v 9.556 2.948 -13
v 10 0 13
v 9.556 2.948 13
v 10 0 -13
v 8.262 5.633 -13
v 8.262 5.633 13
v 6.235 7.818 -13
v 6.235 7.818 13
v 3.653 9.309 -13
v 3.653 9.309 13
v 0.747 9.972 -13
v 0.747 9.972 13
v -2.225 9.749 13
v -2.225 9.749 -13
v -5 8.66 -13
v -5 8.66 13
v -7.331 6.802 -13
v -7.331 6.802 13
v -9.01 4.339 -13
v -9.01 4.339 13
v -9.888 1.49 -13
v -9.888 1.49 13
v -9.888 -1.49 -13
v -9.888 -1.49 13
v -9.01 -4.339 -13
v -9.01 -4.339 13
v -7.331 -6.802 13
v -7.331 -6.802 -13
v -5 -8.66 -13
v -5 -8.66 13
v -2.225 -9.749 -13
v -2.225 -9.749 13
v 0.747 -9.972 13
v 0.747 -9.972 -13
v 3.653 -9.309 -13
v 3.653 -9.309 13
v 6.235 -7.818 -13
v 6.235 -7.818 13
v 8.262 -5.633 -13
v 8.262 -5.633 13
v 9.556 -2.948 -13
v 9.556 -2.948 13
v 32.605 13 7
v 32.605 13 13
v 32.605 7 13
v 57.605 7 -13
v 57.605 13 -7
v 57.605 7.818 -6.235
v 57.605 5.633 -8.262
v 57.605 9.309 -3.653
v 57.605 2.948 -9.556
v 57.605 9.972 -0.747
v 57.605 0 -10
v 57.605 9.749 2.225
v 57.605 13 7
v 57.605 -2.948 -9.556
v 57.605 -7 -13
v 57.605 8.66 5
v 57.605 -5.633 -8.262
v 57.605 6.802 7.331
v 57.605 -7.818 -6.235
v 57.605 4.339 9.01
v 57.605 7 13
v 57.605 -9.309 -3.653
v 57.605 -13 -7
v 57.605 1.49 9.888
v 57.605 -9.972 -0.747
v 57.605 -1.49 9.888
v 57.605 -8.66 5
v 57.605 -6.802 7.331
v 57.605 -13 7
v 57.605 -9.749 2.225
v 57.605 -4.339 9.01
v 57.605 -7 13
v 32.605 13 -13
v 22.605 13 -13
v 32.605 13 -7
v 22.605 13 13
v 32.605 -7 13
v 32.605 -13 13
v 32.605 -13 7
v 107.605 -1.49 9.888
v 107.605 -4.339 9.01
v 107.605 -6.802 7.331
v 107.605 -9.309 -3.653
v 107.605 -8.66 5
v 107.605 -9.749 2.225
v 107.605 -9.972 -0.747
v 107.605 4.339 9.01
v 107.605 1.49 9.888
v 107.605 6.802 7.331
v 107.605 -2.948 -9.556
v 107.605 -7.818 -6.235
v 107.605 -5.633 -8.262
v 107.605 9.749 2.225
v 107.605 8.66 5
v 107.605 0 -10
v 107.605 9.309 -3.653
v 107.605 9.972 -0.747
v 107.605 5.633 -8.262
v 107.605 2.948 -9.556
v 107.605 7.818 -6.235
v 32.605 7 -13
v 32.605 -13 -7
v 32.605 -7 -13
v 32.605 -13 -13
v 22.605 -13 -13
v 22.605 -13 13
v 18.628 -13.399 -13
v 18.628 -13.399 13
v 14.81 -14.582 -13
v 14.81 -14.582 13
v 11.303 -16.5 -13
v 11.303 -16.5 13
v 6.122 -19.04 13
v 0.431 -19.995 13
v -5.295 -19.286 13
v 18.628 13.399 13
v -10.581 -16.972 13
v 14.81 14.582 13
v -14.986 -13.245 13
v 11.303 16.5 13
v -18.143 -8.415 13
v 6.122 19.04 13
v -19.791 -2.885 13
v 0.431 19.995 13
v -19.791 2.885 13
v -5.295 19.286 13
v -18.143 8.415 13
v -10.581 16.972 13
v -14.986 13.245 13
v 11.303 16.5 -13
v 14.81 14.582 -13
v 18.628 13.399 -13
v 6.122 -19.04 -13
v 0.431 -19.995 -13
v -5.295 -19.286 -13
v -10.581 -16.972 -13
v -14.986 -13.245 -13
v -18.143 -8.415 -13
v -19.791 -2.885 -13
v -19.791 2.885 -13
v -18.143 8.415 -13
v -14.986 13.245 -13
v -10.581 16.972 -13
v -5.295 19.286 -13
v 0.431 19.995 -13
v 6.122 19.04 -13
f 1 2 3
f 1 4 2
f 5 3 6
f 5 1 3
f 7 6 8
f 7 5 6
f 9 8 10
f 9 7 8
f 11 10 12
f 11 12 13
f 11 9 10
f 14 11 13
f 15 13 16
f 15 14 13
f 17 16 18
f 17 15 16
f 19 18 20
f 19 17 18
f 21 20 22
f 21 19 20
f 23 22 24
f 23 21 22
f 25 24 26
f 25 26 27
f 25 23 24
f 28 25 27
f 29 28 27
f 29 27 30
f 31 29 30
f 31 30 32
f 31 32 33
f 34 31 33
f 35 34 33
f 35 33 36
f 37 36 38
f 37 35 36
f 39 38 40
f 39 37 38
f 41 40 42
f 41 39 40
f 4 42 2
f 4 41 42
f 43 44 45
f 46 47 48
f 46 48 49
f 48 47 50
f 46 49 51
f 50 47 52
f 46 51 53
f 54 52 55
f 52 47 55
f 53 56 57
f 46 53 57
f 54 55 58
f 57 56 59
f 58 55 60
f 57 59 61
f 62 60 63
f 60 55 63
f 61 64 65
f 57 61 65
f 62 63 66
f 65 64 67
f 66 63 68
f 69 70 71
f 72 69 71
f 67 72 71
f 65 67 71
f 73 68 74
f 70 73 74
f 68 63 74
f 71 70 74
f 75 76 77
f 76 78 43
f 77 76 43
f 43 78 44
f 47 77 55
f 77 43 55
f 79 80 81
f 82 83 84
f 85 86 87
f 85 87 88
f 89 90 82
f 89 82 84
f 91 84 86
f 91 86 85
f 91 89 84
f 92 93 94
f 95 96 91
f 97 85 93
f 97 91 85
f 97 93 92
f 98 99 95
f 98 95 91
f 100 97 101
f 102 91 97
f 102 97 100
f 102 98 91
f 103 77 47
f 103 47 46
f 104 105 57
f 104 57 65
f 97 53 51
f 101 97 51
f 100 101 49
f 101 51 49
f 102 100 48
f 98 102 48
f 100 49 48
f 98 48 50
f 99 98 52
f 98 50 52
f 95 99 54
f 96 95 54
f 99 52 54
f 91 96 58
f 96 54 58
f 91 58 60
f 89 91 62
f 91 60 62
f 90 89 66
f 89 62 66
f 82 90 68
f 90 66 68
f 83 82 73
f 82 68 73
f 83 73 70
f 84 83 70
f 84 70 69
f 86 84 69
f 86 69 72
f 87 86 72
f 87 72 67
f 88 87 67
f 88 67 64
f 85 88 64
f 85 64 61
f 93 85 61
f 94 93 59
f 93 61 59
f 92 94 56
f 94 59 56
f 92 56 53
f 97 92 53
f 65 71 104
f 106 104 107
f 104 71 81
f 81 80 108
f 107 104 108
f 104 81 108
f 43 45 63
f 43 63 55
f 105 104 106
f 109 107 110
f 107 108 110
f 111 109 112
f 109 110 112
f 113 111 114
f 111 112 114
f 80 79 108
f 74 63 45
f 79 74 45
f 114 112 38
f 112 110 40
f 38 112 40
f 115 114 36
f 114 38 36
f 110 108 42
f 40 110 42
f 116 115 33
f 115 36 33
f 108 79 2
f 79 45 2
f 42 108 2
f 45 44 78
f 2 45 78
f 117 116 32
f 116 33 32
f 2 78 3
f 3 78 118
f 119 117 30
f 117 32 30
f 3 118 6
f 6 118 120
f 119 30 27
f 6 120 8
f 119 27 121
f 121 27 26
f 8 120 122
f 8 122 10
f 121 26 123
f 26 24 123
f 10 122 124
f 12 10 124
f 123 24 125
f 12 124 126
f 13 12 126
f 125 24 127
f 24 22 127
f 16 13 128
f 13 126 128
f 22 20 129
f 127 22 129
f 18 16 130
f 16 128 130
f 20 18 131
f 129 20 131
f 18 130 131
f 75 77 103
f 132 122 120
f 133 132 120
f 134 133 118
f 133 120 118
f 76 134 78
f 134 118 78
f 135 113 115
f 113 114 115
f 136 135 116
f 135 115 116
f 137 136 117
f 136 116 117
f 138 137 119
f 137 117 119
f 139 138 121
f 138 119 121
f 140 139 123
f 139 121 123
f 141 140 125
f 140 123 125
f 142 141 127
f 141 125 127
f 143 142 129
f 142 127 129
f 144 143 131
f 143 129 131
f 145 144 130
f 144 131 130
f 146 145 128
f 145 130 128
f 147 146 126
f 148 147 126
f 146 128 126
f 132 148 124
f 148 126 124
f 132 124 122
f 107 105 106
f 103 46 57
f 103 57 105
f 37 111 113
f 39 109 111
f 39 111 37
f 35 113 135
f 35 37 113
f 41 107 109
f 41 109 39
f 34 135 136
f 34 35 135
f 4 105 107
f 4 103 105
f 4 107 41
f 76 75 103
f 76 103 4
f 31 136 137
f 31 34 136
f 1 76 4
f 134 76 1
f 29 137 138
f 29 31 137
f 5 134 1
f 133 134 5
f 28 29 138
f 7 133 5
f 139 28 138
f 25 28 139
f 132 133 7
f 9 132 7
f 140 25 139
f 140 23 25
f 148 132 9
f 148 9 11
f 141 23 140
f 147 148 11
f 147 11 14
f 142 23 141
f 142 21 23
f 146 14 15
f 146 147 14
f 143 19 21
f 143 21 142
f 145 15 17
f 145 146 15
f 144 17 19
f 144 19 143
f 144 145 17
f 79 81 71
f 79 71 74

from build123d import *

# Parameters (mm, degrees)
SKETCH1_R           = 10
BOSS_EXTRUDE1_DEPTH = 13
CUT_EXTRUDE1_DEPTH  = 25
SKETCH3_3_R         = 10
BOSS_EXTRUDE2_DEPTH = 50


with BuildPart() as part:
    # Sketch1 → Boss-Extrude1 (new, symmetric)
    with BuildSketch(Plane.XY):
        with BuildLine():
            Line((57.605309111, 13), (57.605309111, -13))
            Line((57.605309111, -13), (22.605309111, -13))
            ThreePointArc((22.605309111, -13), (16.689229328, -13.895026825), (11.302654555, -16.5))
            ThreePointArc((11.302654555, -16.5), (-20, 0), (11.302654555, 16.5))
            ThreePointArc((11.302654555, 16.5), (16.689229328, 13.895026825), (22.605309111, 13))
            Line((22.605309111, 13), (57.605309111, 13))
        make_face()
        Circle(SKETCH1_R, mode=Mode.SUBTRACT)
    extrude(amount=BOSS_EXTRUDE1_DEPTH, both=True)

    # Sketch3 → Cut-Extrude1 (cut)
    with BuildSketch(Plane(origin=(57.605309111, 0, 0), x_dir=(0, 0, -1), z_dir=(1, 0, 0))):
        Polygon((13, 7), (13, 13), (7, 13), align=None)
        Polygon((13, -13), (13, -7), (7, -13), align=None)
        Polygon((-13, 7), (-7, 13), (-13, 13), align=None)
        Polygon((-13, -13), (-7, -13), (-13, -7), align=None)
    extrude(amount=-CUT_EXTRUDE1_DEPTH, mode=Mode.SUBTRACT)

    # Sketch3<3> → Boss-Extrude2 (add)
    with BuildSketch(Plane(origin=(57.605309111, 0, 0), x_dir=(0, 0, -1), z_dir=(1, 0, 0))):
        Circle(SKETCH3_3_R)
    extrude(amount=BOSS_EXTRUDE2_DEPTH)


solid = part.part
